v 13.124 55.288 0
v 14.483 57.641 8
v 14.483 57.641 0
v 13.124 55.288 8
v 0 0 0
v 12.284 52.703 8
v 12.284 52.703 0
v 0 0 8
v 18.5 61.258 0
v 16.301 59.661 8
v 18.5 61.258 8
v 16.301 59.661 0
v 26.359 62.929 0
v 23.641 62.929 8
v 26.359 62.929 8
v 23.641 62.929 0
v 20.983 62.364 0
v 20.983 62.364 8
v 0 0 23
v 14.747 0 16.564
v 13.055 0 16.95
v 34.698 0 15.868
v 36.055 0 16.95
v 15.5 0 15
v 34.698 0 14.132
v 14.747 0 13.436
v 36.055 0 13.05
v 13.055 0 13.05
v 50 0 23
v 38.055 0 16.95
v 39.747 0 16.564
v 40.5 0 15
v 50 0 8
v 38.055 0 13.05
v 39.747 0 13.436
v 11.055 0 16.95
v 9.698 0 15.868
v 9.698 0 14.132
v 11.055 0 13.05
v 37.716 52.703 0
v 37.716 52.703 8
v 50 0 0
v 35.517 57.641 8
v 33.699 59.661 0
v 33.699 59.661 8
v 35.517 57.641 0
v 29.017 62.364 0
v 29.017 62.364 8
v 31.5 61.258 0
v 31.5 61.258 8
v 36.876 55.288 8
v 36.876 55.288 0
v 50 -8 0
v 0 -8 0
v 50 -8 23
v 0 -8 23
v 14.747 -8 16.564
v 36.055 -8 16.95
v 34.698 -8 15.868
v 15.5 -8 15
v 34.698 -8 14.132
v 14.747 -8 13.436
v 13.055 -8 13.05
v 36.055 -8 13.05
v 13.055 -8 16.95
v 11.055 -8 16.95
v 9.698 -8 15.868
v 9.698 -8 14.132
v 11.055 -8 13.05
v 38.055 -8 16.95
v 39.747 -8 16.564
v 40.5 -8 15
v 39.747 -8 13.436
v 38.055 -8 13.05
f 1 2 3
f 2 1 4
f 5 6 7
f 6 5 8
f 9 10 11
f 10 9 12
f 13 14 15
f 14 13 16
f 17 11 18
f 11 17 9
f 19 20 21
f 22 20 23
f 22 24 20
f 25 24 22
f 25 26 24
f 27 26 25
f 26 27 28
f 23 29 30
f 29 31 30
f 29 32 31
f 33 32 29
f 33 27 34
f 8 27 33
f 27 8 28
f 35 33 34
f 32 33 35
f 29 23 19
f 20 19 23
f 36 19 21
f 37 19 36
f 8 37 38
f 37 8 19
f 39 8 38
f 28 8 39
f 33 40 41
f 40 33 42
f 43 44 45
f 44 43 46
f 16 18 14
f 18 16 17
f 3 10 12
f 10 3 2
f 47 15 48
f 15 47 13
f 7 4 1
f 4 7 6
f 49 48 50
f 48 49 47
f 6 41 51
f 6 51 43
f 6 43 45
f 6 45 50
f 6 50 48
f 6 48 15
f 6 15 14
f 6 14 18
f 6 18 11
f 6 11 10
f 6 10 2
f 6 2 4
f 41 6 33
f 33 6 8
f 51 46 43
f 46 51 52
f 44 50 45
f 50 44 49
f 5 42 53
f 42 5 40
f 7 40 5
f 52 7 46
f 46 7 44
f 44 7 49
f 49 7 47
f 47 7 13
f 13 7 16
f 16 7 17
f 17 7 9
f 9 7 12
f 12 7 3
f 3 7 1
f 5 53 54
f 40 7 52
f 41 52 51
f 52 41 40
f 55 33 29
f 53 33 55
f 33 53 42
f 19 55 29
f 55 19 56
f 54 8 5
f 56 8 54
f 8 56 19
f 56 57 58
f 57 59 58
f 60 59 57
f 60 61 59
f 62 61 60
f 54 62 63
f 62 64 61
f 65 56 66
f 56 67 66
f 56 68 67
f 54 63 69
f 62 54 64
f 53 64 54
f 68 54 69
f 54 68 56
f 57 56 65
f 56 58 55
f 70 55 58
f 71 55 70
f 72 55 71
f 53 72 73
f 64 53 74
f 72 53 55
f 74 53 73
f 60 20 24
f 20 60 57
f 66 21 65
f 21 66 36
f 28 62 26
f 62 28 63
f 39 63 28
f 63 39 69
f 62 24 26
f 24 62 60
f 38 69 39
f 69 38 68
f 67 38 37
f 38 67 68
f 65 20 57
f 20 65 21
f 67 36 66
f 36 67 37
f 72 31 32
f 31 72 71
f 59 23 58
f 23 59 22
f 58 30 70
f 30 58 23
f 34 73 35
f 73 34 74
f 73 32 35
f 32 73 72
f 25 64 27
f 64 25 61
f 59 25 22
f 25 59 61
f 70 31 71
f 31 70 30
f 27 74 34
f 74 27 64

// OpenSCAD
// file: variables.scad
// General
DIFFERENCE_FIX = 0.1;
DIFFERENCE_FIX_NEGATIVE = -1 * DIFFERENCE_FIX;
DIFFERENCE_FIX_2 = 2 * DIFFERENCE_FIX;

componentThickness = 5;

// Support
supportThickness = 8;
supportHoleHeight = 50;
supportWidth = 50;
supportTaper = 12;
supportBaseDepth = 15;
supportMountingHoleRadius = 2;

// Support right
supportRightHoleRadius = 3;

// Camera mount
cameraMountGoproWidth = 63;
cameraMountGoproHeight = 45;
cameraMountGoproDepth = 25;

cameraMountThickness = componentThickness;
cameraMountWidth = cameraMountGoproWidth + 2 * cameraMountThickness;
cameraMountHeight = cameraMountGoproHeight + 2 * cameraMountThickness;
cameraMountDepth = cameraMountGoproDepth + cameraMountThickness;

cameraMountShutterCutoutWidth = 13;
cameraMountShutterCutoutOffsetX = 8;
cameraMountShutterCutoutOffsetZ = 6;
cameraMountShutterCutoutGap = componentThickness;

cameraMountPowerCutoutDepth = 10;
cameraMountPowerCutoutHeight = 9;
cameraMountPowerCutoutOffsetY = 9;
cameraMountPowerCutoutOffsetZ = 7;
cameraMountPowerCutoutGap = componentThickness;

cameraMountBackCutoutOffset = 8;

cameraMountPinOffsetRadius = supportRightHoleRadius + 2;
cameraMountPinOffsetHeight = 2;
cameraMountPinRadiusOffset = 0.1;

// Frame
frameCameraMountOffsetX = 10;
frameCameraMountOffsetY = 5;
frameThickness = componentThickness;
frameWidth = cameraMountWidth + 2 * frameThickness + 2 * frameCameraMountOffsetX;
frameHeight = cameraMountHeight + 2 * frameThickness + 2 * frameCameraMountOffsetY;
frameDepth = 30;
frameHoleTopRadius = supportRightHoleRadius;

framePinOffsetRadius = cameraMountPinOffsetRadius;
framePinOffsetHeight = cameraMountPinOffsetHeight;
framePinRadiusOffset = cameraMountPinRadiusOffset;

frameShutterCutoutWidth = 25;
frameShutterCutoutHeight = 25;
frameShutterCutoutOffsetX = 22;

// Servo cutout
servoWidth = 12;
servoHeight = 23.5;
servoOffsetTop = 6;

// Servo mounting plate
servoPlateRadius = 10;
servoPlateThickness = 1.6;
// main file
include <variables.scad>

// Support
module support() {
    difference() {
        supportBody();

        // Left mounting hole
        translate([supportWidth / 4, DIFFERENCE_FIX, supportBaseDepth])
        mountingHole();

        // Right mounting hole
        translate([supportWidth - supportWidth / 4, DIFFERENCE_FIX, supportBaseDepth])
        mountingHole();
    }
}

// Support body
module supportBody() {
    hull() {
        // Body
        linear_extrude(height = supportThickness)
        polygon(points = [[0, 0], [supportWidth, 0], [supportWidth - supportTaper, supportHoleHeight], [supportTaper, supportHoleHeight]]);

        // Top
        translate([supportWidth / 2, supportHoleHeight, 0])
        linear_extrude(height = supportThickness)
        circle(r = (supportWidth - supportTaper * 2) / 2);
    }

    // Base
    translate([0, -1 * supportThickness, 0])
    cube([supportWidth, supportThickness, supportThickness + supportBaseDepth]);
}

// Mounting holes
module mountingHole() {
    rotate([90, 0, 0])
    hull() {
        translate([-supportMountingHoleRadius / 2, 0, 0])
        cylinder(r = supportMountingHoleRadius, h = supportThickness + DIFFERENCE_FIX_2);
        translate([supportMountingHoleRadius / 2, 0, 0])
        cylinder(r = supportMountingHoleRadius, h = supportThickness + DIFFERENCE_FIX_2);
    }
}
support();
